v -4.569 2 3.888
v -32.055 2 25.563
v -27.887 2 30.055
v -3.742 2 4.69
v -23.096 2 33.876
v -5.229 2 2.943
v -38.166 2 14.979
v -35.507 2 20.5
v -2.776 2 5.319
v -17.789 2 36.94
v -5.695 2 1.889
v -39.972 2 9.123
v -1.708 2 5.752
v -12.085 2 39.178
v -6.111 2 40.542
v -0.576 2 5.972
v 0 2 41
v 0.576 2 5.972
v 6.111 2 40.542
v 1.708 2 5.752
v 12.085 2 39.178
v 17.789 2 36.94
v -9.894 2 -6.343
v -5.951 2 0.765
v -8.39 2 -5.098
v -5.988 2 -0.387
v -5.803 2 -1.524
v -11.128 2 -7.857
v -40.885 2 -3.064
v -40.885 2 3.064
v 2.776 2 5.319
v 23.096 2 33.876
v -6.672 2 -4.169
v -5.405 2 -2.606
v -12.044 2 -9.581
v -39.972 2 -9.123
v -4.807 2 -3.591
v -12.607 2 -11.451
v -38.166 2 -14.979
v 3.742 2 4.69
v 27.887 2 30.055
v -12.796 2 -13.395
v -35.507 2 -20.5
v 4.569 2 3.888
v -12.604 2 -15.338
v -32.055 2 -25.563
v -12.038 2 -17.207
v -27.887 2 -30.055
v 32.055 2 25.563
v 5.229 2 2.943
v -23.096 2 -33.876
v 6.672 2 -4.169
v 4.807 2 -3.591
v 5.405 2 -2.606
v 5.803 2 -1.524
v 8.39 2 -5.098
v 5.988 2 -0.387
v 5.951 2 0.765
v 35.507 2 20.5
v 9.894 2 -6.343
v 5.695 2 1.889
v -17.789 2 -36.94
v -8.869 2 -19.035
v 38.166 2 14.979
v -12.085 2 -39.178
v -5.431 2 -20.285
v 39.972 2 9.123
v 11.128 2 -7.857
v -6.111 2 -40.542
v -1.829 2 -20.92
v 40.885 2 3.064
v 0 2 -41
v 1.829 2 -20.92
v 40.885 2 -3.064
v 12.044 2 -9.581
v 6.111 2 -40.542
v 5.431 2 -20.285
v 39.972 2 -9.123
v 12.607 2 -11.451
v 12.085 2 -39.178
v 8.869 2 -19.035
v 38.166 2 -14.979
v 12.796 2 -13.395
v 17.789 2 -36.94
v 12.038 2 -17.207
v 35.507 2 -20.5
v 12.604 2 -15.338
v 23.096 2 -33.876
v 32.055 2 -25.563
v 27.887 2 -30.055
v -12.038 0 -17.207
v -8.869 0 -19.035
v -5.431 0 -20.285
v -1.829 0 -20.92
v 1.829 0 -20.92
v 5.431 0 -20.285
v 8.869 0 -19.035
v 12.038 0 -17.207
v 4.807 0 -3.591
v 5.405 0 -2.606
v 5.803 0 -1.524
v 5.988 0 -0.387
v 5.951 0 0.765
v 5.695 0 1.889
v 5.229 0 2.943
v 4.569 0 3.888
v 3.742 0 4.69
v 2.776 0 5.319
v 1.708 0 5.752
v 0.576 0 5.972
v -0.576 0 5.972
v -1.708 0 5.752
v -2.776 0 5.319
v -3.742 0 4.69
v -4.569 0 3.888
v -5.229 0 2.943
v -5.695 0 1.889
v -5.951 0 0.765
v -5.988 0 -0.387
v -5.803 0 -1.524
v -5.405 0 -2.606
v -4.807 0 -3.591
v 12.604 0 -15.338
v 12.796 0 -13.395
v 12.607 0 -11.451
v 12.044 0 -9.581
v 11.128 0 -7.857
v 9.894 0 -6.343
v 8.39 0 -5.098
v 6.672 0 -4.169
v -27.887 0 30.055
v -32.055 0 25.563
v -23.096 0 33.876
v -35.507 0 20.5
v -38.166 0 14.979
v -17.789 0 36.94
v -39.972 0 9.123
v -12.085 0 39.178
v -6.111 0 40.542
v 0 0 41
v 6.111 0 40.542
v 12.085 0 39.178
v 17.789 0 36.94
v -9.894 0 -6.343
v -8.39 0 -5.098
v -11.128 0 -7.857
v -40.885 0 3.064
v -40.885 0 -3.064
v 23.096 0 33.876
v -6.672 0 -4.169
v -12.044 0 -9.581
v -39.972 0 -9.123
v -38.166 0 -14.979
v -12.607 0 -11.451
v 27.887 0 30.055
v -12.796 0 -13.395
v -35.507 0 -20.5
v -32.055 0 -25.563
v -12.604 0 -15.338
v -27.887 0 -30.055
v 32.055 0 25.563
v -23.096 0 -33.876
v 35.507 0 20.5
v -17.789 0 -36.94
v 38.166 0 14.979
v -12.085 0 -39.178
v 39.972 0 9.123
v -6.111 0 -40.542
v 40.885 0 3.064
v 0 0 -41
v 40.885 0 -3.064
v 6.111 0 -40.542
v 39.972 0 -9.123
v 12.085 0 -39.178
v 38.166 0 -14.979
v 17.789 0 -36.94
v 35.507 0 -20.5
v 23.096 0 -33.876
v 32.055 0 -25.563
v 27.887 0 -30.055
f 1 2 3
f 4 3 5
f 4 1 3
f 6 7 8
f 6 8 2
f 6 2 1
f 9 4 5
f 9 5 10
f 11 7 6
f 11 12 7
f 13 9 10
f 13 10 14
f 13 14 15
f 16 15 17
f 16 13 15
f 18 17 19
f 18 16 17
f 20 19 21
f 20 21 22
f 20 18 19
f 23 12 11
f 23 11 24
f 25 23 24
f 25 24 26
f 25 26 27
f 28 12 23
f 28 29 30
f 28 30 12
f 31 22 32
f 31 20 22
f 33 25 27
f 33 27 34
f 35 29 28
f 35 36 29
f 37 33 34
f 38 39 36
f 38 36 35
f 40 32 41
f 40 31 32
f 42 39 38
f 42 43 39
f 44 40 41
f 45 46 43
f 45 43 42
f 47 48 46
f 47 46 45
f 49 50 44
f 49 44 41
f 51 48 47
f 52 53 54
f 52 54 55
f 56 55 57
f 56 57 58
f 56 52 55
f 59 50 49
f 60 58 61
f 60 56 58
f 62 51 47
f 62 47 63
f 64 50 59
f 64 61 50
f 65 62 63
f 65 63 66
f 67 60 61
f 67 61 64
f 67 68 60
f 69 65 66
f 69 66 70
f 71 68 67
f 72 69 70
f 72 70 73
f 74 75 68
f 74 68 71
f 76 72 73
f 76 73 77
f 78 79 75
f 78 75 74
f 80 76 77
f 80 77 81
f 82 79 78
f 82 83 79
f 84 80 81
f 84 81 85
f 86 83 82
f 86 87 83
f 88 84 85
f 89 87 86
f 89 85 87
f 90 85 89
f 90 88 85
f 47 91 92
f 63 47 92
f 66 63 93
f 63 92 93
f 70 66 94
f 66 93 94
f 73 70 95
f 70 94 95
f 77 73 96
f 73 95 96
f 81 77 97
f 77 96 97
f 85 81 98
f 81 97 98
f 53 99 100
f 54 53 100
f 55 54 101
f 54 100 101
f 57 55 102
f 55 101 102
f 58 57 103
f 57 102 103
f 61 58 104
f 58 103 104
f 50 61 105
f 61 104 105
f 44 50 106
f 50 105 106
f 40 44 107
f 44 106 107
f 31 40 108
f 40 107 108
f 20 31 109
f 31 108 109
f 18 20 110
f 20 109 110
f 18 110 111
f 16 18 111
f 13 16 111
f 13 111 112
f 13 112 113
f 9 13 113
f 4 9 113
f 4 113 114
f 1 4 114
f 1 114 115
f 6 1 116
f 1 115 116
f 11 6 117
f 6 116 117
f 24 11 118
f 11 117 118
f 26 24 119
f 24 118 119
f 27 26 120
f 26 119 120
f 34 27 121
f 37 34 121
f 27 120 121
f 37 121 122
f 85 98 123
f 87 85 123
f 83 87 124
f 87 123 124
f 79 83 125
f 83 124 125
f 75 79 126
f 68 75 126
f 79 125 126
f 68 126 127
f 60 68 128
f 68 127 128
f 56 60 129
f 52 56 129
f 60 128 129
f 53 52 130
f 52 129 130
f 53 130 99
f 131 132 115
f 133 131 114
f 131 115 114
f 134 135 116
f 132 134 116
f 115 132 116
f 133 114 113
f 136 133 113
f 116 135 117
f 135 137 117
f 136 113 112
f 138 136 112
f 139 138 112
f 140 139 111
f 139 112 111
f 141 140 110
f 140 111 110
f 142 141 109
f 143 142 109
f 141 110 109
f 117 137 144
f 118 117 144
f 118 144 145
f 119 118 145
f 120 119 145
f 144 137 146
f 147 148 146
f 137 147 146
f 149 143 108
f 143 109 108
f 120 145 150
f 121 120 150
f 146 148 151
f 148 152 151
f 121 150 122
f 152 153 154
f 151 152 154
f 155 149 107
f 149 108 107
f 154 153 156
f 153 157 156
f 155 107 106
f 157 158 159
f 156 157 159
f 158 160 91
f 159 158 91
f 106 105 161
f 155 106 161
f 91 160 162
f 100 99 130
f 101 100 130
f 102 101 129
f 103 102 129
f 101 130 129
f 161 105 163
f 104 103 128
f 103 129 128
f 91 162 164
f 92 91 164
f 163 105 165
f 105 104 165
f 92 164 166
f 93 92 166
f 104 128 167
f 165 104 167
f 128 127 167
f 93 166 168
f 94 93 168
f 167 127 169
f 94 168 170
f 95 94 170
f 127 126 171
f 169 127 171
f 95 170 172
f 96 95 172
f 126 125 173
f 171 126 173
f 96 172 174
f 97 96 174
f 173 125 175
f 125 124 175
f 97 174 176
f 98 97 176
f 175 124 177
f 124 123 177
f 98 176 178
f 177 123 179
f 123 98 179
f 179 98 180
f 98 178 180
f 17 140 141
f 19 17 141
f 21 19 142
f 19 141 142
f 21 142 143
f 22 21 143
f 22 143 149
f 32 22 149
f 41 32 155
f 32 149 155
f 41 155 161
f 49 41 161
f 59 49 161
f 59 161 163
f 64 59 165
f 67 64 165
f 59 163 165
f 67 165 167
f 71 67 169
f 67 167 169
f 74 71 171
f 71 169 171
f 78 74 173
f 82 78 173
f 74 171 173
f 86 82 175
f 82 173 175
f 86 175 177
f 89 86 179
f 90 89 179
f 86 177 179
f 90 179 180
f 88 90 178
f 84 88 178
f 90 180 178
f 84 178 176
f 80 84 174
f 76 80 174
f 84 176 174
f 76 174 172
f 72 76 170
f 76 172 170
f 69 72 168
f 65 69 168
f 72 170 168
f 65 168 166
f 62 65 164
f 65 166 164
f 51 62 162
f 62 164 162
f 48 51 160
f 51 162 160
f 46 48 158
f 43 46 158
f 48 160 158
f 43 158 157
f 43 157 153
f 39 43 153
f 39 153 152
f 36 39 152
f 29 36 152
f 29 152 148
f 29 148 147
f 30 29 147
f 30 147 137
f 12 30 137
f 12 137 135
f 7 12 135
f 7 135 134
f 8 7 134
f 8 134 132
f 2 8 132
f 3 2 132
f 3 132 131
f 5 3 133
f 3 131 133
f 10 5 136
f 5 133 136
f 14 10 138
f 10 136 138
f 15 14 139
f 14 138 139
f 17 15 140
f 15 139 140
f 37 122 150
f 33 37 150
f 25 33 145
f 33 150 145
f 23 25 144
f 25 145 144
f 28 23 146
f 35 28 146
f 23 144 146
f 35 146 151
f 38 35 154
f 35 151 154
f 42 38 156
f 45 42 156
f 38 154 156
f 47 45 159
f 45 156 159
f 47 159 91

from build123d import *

# Parameters (mm, degrees)
SKETCH1_R           = 41
BOSS_EXTRUDE1_DEPTH = 2


with BuildPart() as part:
    # Sketch1 → Boss-Extrude1 (new body)
    # profile 1 of 2: a face of its own
    with BuildSketch(Plane(origin=(0, 0, 0), x_dir=(1, 0, 0), z_dir=(0, 1, 0))):
        with Locations(Location((0, 0, 0), (0, 0, 270))):
            Circle(SKETCH1_R)
        with BuildLine():
            ThreePointArc((21, 0), (-9.127670618, -18.912578594), (-13.065298009, 16.440741709))
            ThreePointArc((-13.065298009, 16.440741709), (-12.557369181, 16.831888761), (-12.037737576, 17.20734942))
            ThreePointArc((-12.037737576, 17.20734942), (0, 21), (12.037737576, 17.20734942))
            ThreePointArc((12.037737576, 17.20734942), (12.557369181, 16.831888761), (13.065298009, 16.440741709))
            ThreePointArc((13.065298009, 16.440741709), (18.912578594, 9.127670618), (21, 0))
        make_face(mode=Mode.SUBTRACT)
    # profile 2 of 2: a face of its own
    with BuildSketch(Plane(origin=(0, 0, 0), x_dir=(1, 0, 0), z_dir=(0, 1, 0))):
        with BuildLine():
            ThreePointArc((-12.037737576, 17.20734942), (-12.557369181, 16.831888761), (-13.065298009, 16.440741709))
            ThreePointArc((-13.065298009, 16.440741709), (-9.127670618, -18.912578594), (21, 0))
            ThreePointArc((21, 0), (18.912578594, 9.127670618), (13.065298009, 16.440741709))
            ThreePointArc((13.065298009, 16.440741709), (12.557369181, 16.831888761), (12.037737576, 17.20734942))
            ThreePointArc((12.037737576, 17.20734942), (11.628117295, 8.696683132), (4.806650128, 3.591116059))
            ThreePointArc((4.806650128, 3.591116059), (0, -6), (-4.806650128, 3.591116059))
            ThreePointArc((-4.806650128, 3.591116059), (-11.628117295, 8.696683132), (-12.037737576, 17.20734942))
        make_face()
    extrude(amount=BOSS_EXTRUDE1_DEPTH)


solid = part.part
